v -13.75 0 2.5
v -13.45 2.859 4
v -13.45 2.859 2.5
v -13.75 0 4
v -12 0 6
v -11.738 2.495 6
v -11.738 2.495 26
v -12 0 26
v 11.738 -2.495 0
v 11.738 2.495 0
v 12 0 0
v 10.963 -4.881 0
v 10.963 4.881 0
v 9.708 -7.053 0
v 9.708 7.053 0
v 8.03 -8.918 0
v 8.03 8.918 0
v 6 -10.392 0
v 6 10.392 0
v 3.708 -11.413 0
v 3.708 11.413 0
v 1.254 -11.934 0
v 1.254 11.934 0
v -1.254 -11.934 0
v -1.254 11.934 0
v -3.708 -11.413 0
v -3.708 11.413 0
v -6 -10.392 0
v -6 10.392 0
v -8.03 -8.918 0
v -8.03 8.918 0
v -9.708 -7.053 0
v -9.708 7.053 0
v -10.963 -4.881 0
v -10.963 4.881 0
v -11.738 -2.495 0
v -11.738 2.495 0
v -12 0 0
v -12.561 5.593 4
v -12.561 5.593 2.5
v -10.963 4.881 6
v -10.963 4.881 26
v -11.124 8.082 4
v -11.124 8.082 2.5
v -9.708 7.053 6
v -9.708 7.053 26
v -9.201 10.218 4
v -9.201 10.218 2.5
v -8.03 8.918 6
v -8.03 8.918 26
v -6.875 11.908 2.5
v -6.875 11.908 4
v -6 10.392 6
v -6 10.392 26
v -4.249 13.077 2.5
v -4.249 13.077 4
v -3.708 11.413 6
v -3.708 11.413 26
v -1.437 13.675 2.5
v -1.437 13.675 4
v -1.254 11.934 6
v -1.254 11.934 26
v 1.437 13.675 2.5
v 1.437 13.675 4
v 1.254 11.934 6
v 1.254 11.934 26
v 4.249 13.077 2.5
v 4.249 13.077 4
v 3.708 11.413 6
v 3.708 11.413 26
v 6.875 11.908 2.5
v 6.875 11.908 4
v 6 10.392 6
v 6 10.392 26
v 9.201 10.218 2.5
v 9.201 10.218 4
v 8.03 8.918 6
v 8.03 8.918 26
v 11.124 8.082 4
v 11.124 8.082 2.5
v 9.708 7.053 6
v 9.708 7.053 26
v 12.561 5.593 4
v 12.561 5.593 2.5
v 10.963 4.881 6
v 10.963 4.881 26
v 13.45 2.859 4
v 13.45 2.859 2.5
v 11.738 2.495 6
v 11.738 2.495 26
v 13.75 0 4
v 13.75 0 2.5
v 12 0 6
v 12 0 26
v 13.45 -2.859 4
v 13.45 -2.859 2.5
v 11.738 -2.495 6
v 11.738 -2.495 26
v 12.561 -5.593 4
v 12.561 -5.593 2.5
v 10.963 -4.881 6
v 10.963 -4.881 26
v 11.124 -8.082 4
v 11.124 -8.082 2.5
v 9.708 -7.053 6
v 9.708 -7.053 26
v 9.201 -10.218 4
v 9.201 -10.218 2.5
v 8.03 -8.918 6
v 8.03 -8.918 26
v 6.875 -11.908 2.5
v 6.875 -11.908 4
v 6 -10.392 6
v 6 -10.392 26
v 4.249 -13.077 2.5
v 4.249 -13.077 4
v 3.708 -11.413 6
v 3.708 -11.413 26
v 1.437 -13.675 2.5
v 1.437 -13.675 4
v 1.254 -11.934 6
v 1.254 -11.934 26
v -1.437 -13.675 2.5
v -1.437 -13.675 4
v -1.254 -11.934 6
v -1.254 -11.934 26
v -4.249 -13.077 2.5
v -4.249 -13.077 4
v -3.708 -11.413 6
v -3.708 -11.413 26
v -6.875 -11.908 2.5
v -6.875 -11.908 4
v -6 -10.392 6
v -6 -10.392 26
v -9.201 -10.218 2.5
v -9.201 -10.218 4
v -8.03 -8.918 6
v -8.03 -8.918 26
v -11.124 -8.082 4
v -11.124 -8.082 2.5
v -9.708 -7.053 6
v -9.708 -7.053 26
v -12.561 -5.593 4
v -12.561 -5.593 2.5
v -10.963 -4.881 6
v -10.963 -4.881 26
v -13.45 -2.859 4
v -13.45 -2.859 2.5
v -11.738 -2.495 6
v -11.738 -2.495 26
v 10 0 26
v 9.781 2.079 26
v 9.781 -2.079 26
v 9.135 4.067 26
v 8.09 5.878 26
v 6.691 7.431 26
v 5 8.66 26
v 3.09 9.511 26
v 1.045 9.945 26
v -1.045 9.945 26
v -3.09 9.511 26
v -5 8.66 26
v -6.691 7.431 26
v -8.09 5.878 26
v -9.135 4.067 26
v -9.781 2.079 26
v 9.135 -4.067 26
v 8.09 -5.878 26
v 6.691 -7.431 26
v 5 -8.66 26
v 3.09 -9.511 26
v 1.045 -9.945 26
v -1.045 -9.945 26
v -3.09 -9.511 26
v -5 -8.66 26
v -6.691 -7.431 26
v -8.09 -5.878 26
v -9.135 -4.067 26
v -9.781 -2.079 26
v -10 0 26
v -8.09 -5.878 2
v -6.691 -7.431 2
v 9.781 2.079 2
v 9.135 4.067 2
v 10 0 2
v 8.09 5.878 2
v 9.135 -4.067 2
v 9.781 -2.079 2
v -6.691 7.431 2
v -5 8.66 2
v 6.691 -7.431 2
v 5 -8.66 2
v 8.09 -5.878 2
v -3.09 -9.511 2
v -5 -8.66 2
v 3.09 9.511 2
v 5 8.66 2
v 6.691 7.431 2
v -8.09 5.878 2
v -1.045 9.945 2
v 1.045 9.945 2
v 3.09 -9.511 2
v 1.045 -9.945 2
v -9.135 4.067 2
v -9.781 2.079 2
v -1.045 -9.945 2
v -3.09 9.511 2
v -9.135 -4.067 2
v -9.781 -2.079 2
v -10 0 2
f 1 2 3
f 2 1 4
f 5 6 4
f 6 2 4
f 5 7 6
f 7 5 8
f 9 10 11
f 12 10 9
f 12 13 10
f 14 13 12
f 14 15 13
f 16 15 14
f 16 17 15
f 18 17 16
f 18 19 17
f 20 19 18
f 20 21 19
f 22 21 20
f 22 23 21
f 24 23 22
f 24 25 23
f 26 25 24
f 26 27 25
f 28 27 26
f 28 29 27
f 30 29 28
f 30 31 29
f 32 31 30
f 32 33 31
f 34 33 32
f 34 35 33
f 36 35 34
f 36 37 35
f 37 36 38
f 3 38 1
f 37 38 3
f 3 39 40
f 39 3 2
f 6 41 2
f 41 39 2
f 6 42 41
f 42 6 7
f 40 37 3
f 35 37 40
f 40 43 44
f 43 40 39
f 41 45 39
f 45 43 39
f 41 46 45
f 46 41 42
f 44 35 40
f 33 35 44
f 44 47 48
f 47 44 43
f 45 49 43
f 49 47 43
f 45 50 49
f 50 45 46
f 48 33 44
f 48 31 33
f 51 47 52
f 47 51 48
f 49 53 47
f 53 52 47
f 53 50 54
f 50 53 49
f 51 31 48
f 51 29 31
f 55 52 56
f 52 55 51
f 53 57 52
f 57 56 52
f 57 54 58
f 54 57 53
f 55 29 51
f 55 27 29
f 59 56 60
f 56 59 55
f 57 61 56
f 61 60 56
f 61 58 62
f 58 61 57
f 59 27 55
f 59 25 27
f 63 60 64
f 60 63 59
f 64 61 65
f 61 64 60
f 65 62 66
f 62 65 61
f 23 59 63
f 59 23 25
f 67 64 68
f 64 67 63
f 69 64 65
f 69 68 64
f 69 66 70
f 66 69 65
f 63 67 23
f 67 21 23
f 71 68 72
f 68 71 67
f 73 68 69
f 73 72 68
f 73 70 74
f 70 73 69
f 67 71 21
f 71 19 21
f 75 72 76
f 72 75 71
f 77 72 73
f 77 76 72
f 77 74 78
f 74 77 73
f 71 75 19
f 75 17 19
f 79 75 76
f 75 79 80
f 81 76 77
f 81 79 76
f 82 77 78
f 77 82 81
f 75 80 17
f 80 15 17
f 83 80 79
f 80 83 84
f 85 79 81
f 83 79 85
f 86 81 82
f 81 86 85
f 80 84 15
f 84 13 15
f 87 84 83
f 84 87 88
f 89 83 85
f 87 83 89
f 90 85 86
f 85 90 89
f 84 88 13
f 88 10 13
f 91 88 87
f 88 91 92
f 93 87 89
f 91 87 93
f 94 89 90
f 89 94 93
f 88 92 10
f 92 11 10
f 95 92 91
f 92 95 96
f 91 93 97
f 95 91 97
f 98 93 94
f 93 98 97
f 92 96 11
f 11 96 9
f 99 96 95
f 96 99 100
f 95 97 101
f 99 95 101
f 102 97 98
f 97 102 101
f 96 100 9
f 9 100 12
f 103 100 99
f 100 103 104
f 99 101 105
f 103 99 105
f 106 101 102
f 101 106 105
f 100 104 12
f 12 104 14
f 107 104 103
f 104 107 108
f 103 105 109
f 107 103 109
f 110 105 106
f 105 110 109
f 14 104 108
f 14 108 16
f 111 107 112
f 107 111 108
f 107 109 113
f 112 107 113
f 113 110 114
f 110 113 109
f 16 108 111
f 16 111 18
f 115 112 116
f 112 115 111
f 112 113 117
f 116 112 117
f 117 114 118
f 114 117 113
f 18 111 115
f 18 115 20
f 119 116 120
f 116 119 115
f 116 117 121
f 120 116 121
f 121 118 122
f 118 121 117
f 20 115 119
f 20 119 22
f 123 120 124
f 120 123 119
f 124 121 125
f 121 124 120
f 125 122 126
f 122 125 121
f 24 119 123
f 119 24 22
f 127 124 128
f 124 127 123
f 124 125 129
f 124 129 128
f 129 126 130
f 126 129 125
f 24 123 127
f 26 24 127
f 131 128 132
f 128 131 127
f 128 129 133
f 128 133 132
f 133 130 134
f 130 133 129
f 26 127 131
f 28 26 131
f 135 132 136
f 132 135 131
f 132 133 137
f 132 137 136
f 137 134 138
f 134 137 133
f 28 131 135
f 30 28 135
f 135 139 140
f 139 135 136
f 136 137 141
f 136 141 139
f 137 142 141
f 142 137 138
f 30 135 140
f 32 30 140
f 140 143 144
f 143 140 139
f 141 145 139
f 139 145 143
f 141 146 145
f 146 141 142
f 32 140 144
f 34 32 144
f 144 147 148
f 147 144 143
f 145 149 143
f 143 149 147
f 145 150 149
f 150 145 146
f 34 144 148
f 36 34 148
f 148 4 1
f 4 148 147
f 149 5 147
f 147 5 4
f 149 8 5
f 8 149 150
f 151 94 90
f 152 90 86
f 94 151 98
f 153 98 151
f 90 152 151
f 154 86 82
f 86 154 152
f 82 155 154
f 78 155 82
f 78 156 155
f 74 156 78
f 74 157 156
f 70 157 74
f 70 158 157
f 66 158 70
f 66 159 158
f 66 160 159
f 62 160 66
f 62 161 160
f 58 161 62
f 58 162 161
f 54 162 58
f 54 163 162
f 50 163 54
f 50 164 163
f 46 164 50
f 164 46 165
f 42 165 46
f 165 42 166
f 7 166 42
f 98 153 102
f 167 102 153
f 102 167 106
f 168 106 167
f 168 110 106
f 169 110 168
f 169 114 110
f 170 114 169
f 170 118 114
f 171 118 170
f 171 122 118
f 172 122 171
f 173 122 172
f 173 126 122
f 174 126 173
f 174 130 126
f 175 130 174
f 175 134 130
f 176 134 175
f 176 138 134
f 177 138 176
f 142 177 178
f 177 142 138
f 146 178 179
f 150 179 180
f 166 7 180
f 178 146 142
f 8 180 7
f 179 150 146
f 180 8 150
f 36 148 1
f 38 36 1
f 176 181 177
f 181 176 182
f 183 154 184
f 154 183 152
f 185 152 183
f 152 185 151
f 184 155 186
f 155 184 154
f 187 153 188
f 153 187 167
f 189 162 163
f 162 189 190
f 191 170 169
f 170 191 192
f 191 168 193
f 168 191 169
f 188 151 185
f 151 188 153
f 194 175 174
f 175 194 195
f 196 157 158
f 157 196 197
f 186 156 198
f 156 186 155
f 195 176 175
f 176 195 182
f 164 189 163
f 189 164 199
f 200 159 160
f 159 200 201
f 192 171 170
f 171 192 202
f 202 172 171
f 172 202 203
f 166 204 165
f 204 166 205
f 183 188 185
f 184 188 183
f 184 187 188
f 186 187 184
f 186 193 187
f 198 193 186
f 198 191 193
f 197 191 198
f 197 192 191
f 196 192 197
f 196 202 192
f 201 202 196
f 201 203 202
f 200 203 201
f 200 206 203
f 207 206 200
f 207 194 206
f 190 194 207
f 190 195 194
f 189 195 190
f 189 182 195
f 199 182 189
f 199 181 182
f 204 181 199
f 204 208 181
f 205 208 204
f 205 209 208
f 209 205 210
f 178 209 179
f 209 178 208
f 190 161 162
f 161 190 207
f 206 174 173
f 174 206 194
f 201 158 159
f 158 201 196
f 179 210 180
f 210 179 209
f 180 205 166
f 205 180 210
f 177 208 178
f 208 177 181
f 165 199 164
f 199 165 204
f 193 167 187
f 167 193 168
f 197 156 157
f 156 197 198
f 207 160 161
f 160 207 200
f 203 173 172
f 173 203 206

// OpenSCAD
thickness = 2;
innerDiameter=20;
height=26;

module dummy() {}

d0 = innerDiameter;
h = height;
d1 = innerDiameter+2*thickness;

points = [[0,0],[d1/2,0],[d1/2+1.75,2.5],[d1/2+1.75,4],[d1/2,3.5+2.5],[d1/2,h],[0,h]];
difference() {
   rotate_extrude() 
    polygon(points);
    translate([0,0,thickness])
    cylinder(h=h,d=d0);
}
